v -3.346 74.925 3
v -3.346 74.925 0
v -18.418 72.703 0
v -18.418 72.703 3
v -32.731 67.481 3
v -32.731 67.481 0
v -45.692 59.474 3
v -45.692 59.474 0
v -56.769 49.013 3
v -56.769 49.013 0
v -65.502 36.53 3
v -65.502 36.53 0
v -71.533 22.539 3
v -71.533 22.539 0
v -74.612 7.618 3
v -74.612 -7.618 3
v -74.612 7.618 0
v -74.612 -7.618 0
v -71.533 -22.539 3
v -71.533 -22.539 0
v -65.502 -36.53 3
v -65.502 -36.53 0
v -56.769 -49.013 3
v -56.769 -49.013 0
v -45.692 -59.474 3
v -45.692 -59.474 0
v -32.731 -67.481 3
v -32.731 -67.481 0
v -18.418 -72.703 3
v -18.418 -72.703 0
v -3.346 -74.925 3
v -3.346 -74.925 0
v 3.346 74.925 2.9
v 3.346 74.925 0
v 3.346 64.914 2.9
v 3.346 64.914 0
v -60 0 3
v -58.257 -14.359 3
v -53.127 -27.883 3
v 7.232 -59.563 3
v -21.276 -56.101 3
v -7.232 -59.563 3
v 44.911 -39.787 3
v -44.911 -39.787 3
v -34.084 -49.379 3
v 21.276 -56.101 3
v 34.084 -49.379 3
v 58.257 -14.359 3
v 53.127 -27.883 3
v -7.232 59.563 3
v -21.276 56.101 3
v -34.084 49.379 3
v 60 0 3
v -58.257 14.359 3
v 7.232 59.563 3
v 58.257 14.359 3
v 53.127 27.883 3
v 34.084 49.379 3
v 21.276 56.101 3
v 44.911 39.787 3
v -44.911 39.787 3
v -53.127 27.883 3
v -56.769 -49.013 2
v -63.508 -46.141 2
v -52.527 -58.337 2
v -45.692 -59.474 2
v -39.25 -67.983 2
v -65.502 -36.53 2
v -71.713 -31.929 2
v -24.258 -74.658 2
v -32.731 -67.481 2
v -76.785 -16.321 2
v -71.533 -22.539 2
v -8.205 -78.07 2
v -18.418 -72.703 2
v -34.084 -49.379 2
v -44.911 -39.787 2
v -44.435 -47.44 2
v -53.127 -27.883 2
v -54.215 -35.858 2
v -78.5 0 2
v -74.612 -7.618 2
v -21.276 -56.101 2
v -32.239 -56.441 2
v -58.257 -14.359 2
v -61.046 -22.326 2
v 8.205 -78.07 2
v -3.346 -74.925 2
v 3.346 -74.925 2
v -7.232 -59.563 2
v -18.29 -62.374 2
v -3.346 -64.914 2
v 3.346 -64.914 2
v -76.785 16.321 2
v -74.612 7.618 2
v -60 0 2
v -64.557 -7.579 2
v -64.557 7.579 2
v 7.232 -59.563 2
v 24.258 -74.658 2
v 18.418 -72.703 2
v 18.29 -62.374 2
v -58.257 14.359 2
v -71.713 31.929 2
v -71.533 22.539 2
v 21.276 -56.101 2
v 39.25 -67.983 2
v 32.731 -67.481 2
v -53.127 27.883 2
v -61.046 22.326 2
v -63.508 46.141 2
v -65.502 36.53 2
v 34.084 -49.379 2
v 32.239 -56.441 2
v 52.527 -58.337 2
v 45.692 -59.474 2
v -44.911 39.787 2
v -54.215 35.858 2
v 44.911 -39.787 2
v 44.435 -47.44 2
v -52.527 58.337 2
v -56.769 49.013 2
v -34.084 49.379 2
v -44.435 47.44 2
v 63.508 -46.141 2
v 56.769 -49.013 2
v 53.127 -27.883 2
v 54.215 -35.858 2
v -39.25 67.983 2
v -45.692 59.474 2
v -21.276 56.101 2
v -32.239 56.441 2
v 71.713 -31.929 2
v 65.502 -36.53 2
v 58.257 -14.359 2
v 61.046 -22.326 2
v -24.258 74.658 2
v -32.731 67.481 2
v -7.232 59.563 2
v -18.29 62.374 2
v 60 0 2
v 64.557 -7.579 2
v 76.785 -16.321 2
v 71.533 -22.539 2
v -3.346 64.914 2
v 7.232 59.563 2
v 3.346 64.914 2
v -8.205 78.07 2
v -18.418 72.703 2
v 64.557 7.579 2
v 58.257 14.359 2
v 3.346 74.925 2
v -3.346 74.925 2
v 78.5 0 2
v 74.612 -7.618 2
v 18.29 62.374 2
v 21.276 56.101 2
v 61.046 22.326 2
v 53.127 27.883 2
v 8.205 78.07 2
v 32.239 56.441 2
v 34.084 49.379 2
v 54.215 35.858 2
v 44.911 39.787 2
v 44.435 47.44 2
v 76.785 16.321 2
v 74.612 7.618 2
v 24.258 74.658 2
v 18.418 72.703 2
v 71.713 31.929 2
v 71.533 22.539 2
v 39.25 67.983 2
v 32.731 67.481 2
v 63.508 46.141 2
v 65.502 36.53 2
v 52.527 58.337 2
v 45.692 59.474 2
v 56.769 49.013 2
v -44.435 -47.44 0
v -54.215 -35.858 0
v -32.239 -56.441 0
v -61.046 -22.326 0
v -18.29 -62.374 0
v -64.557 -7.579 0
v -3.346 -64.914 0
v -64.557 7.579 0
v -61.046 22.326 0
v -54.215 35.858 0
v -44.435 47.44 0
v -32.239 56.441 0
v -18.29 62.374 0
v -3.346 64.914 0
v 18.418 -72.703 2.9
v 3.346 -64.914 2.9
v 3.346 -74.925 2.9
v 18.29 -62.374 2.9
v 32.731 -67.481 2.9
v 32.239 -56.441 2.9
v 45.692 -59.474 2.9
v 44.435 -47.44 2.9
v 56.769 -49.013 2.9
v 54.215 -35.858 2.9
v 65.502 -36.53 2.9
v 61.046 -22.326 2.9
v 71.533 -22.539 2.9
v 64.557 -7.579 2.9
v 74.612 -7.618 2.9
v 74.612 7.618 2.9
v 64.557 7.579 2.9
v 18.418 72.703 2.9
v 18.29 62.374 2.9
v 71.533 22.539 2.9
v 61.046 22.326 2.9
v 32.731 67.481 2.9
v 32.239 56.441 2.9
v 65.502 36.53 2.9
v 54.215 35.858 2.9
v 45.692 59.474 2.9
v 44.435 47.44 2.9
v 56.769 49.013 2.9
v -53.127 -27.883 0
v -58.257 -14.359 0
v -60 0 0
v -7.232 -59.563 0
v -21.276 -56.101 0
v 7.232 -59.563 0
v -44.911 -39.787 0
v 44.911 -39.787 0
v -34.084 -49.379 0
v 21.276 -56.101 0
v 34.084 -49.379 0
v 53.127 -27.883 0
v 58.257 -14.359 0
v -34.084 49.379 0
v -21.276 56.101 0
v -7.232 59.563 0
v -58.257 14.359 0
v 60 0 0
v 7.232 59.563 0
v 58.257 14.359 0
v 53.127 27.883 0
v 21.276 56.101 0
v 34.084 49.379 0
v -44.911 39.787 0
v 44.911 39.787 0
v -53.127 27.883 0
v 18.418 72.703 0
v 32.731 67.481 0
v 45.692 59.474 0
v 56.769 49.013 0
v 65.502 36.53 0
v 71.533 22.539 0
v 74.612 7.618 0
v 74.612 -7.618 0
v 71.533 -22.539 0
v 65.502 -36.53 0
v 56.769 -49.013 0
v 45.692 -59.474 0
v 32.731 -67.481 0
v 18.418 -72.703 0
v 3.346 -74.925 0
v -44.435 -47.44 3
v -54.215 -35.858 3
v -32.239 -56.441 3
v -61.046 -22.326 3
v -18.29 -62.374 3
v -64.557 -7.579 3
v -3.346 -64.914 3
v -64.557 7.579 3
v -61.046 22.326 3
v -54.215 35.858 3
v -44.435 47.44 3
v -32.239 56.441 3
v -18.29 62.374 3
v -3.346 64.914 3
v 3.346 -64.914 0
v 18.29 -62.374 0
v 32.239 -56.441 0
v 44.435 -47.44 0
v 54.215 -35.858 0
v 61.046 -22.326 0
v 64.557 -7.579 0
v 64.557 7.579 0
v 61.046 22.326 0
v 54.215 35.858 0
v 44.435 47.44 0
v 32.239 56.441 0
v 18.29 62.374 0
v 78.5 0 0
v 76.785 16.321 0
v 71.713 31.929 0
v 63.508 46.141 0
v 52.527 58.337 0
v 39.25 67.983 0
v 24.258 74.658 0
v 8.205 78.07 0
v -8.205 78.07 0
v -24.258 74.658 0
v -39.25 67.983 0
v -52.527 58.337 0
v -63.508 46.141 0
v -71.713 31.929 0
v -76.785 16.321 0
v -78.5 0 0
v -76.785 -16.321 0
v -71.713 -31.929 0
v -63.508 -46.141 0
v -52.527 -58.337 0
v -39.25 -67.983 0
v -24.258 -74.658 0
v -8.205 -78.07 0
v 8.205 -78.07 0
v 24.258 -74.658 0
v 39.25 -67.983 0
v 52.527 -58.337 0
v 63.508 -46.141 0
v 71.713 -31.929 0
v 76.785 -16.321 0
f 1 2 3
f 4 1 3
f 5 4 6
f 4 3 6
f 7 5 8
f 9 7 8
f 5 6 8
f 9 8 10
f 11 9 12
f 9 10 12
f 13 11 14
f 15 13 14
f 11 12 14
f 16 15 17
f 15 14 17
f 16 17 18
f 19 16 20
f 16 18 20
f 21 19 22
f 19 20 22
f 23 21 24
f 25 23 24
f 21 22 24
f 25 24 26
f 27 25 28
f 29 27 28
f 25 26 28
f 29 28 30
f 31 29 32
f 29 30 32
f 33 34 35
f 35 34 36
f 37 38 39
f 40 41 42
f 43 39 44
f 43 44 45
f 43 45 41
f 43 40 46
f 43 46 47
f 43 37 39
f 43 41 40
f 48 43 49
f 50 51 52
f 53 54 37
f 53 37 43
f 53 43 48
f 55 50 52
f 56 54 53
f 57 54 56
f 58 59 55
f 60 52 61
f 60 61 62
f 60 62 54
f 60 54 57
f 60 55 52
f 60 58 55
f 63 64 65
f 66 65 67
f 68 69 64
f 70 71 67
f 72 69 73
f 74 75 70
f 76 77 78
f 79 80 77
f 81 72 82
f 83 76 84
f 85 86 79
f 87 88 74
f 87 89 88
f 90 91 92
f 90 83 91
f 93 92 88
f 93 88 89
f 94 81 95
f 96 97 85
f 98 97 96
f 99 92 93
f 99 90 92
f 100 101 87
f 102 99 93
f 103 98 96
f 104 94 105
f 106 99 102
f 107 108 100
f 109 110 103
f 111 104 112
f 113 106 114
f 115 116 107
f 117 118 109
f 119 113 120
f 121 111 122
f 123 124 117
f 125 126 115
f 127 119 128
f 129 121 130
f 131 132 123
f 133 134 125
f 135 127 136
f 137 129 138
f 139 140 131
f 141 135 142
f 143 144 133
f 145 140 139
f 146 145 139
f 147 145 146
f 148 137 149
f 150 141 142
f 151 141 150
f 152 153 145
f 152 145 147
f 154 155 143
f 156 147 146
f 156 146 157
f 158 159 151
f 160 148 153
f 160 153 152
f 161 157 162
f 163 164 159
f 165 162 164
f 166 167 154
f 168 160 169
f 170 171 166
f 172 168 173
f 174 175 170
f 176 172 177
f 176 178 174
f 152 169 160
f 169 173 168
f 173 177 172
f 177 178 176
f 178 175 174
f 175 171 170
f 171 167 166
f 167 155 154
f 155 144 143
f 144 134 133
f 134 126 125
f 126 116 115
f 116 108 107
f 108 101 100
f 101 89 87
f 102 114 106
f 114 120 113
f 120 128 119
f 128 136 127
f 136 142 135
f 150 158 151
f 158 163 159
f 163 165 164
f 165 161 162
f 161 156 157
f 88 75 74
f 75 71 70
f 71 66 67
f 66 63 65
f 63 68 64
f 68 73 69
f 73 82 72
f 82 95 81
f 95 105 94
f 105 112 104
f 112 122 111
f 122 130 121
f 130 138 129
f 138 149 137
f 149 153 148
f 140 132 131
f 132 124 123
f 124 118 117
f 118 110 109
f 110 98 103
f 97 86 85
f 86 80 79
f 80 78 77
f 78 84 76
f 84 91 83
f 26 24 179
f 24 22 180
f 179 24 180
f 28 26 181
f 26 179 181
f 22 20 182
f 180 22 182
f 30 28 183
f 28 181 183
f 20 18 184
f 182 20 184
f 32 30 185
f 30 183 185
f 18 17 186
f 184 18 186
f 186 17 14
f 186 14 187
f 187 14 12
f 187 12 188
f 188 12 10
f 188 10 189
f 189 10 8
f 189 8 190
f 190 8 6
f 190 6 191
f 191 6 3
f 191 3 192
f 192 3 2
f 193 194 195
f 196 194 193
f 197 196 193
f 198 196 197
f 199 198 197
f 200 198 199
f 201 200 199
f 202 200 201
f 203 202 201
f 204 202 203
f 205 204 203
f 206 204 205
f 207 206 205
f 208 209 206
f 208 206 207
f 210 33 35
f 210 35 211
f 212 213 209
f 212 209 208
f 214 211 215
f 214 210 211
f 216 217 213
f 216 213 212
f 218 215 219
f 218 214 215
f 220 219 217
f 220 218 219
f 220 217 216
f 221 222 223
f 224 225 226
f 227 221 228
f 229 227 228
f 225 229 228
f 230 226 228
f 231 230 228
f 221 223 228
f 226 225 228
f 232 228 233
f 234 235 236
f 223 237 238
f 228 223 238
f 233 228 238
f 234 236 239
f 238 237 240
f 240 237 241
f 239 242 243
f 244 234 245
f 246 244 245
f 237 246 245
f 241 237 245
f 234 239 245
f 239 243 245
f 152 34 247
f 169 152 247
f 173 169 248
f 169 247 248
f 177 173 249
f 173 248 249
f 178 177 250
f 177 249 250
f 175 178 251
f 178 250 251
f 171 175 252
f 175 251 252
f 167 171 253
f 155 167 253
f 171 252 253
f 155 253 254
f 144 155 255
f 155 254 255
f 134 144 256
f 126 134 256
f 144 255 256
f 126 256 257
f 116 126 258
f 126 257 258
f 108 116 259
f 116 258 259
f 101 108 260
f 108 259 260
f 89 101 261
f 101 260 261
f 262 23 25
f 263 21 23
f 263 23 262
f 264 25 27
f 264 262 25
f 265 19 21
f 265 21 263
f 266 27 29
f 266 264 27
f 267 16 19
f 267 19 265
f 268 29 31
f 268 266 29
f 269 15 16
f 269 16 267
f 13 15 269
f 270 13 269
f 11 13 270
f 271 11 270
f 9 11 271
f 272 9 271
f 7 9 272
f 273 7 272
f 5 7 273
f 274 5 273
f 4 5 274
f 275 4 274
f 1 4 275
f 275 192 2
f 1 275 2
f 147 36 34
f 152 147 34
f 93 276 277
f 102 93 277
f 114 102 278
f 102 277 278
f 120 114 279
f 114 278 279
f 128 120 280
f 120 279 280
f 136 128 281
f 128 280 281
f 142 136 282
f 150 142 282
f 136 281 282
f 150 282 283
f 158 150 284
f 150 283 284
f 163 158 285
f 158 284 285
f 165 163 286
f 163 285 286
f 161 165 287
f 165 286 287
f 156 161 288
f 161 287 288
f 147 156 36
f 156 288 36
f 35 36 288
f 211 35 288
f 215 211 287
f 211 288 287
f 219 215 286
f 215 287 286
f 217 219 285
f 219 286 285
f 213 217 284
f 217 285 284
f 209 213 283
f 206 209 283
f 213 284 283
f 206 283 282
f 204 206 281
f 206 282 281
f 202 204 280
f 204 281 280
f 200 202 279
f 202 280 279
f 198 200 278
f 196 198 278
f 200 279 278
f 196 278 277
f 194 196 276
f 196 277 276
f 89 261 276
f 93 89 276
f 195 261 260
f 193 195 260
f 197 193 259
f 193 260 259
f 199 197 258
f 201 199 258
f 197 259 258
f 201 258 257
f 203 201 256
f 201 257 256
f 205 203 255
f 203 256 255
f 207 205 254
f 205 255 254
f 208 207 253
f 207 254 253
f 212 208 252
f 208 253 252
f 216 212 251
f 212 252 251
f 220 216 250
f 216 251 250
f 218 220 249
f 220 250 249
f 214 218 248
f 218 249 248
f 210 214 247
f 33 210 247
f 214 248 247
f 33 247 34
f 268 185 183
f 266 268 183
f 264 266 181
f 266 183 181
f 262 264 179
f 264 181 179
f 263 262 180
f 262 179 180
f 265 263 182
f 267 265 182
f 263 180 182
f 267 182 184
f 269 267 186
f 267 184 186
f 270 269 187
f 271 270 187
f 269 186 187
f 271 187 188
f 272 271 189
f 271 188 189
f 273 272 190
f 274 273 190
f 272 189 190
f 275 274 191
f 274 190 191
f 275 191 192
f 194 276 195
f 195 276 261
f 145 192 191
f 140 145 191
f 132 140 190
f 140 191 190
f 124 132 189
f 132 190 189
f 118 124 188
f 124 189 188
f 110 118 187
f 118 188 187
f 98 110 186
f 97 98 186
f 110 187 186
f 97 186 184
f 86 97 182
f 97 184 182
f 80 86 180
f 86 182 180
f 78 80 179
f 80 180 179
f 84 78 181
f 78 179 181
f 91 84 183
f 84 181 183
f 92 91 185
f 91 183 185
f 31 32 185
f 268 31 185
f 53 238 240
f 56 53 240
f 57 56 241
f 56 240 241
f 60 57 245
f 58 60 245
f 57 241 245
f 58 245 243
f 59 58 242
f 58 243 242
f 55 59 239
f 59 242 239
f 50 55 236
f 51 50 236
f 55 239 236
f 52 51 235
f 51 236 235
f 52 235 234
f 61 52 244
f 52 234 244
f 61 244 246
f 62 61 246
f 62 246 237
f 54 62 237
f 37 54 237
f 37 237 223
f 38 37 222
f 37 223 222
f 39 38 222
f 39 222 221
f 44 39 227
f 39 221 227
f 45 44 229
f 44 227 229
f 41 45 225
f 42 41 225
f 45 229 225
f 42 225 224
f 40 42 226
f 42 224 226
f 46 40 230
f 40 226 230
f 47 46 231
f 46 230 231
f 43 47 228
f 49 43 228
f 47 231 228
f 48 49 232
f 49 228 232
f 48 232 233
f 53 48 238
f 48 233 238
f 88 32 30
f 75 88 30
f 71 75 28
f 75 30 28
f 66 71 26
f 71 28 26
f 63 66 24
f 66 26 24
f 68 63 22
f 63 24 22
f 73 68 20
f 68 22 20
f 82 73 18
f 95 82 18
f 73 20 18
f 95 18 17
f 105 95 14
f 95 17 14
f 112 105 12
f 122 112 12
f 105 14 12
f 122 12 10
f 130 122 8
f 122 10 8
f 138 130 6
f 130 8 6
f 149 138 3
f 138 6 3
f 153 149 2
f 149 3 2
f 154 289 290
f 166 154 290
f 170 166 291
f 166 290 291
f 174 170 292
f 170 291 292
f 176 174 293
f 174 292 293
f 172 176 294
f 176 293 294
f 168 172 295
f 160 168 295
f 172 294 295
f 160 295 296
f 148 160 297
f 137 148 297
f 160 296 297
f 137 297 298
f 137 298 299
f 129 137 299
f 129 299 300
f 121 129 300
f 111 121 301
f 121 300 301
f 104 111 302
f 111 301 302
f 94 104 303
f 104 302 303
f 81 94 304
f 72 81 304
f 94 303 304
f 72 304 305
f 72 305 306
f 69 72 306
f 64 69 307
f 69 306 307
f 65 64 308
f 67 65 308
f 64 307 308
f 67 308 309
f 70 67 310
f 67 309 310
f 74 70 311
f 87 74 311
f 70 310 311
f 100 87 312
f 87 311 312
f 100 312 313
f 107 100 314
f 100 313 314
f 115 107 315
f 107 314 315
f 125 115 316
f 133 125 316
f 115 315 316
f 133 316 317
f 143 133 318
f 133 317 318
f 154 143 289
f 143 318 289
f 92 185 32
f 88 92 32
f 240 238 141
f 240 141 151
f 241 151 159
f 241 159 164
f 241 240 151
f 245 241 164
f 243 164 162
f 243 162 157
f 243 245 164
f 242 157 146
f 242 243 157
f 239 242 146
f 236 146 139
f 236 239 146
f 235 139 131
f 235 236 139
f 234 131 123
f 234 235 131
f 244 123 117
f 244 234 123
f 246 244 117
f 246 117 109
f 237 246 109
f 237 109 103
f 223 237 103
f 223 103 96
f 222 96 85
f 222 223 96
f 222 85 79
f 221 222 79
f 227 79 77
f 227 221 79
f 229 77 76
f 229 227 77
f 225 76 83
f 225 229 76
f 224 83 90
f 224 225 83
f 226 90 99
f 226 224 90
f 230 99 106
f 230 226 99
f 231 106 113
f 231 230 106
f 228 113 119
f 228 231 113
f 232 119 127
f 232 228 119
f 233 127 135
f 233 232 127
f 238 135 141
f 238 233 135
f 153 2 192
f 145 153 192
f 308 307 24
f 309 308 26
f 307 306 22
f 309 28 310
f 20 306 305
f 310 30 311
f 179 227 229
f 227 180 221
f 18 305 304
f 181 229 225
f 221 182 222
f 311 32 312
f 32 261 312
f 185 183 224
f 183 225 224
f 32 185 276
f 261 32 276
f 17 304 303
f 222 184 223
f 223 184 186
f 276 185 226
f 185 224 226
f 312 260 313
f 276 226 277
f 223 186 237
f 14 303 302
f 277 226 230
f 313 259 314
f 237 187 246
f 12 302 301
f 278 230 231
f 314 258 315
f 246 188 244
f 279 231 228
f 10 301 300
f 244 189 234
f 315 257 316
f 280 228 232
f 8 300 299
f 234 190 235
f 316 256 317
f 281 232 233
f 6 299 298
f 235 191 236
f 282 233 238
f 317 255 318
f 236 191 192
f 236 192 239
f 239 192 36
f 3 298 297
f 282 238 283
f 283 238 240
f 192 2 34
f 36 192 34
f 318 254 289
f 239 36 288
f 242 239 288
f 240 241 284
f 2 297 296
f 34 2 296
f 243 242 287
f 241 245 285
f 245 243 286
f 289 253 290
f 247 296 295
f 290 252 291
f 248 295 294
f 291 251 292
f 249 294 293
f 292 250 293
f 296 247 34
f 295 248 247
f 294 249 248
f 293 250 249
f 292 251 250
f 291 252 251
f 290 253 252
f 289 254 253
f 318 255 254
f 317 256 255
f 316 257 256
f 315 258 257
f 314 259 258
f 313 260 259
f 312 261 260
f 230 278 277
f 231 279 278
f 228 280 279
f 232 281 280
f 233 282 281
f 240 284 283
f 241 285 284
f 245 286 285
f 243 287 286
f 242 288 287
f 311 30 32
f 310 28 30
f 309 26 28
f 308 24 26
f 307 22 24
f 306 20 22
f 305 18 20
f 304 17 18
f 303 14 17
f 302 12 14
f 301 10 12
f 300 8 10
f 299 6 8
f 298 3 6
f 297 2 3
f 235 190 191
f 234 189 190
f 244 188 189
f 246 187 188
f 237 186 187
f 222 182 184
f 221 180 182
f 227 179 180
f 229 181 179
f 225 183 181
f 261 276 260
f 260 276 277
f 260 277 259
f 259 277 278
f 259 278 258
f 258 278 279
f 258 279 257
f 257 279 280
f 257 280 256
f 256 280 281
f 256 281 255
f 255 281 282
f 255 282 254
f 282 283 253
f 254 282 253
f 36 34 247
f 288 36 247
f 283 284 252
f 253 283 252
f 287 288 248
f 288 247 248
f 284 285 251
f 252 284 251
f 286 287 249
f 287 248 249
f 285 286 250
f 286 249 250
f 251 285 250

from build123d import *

# Parameters (mm, degrees)
F1_DEPTH = 3
F2_DEPTH = 2.9
F0_R     = 60
F3_DEPTH = 3
F0_R_2   = 78.5
F4_DEPTH = 2


with BuildPart() as f1:
    # F0 (on Top) → F1 (new body)
    with BuildSketch(Plane.XY):
        with BuildLine():
            Line((-3.345542, 64.913846), (-3.345542, 74.925345))
            ThreePointArc((-3.345542, 74.925345), (-75, 0), (-3.345542, -74.925345))
            Line((-3.345542, -74.925345), (-3.345542, -64.913846))
            ThreePointArc((-3.345542, -64.913846), (-65, 0), (-3.345542, 64.913846))
        make_face()
    extrude(amount=F1_DEPTH)


with BuildPart() as f2:
    # F0 (on Top) → F2 (new body)
    with BuildSketch(Plane.XY):
        with BuildLine():
            Line((3.345542, -64.913846), (3.345542, -74.925345))
            ThreePointArc((3.345542, -74.925345), (75, 0), (3.345542, 74.925345))
            Line((3.345542, 74.925345), (3.345542, 64.913846))
            ThreePointArc((3.345542, 64.913846), (65, 0), (3.345542, -64.913846))
        make_face()
    extrude(amount=F2_DEPTH)


with BuildPart() as f3:
    # F0 (on Top) → F3 (new body)
    with BuildSketch(Plane.XY):
        Circle(F0_R)
    extrude(amount=F3_DEPTH)


with BuildPart() as f4:
    # F0 (on Top) → F4 (new body)
    with BuildSketch(Plane.XY):
        Circle(F0_R_2)
        with BuildLine():
            ThreePointArc((-3.345542, -74.925345), (-75, 0), (-3.345542, 74.925345))
            Line((-3.345542, 74.925345), (-3.345542, 64.913846))
            ThreePointArc((-3.345542, 64.913846), (-65, 0), (-3.345542, -64.913846))
            Line((-3.345542, -64.913846), (-3.345542, -74.925345))
        make_face(mode=Mode.SUBTRACT)
        Circle(F0_R, mode=Mode.SUBTRACT)
        with BuildLine():
            ThreePointArc((3.345542, 74.925345), (75, 0), (3.345542, -74.925345))
            Line((3.345542, -74.925345), (3.345542, -64.913846))
            ThreePointArc((3.345542, -64.913846), (65, 0), (3.345542, 64.913846))
            Line((3.345542, 64.913846), (3.345542, 74.925345))
        make_face(mode=Mode.SUBTRACT)
    extrude(amount=F4_DEPTH)


solid = Compound([f1.part, f2.part, f3.part, f4.part])
